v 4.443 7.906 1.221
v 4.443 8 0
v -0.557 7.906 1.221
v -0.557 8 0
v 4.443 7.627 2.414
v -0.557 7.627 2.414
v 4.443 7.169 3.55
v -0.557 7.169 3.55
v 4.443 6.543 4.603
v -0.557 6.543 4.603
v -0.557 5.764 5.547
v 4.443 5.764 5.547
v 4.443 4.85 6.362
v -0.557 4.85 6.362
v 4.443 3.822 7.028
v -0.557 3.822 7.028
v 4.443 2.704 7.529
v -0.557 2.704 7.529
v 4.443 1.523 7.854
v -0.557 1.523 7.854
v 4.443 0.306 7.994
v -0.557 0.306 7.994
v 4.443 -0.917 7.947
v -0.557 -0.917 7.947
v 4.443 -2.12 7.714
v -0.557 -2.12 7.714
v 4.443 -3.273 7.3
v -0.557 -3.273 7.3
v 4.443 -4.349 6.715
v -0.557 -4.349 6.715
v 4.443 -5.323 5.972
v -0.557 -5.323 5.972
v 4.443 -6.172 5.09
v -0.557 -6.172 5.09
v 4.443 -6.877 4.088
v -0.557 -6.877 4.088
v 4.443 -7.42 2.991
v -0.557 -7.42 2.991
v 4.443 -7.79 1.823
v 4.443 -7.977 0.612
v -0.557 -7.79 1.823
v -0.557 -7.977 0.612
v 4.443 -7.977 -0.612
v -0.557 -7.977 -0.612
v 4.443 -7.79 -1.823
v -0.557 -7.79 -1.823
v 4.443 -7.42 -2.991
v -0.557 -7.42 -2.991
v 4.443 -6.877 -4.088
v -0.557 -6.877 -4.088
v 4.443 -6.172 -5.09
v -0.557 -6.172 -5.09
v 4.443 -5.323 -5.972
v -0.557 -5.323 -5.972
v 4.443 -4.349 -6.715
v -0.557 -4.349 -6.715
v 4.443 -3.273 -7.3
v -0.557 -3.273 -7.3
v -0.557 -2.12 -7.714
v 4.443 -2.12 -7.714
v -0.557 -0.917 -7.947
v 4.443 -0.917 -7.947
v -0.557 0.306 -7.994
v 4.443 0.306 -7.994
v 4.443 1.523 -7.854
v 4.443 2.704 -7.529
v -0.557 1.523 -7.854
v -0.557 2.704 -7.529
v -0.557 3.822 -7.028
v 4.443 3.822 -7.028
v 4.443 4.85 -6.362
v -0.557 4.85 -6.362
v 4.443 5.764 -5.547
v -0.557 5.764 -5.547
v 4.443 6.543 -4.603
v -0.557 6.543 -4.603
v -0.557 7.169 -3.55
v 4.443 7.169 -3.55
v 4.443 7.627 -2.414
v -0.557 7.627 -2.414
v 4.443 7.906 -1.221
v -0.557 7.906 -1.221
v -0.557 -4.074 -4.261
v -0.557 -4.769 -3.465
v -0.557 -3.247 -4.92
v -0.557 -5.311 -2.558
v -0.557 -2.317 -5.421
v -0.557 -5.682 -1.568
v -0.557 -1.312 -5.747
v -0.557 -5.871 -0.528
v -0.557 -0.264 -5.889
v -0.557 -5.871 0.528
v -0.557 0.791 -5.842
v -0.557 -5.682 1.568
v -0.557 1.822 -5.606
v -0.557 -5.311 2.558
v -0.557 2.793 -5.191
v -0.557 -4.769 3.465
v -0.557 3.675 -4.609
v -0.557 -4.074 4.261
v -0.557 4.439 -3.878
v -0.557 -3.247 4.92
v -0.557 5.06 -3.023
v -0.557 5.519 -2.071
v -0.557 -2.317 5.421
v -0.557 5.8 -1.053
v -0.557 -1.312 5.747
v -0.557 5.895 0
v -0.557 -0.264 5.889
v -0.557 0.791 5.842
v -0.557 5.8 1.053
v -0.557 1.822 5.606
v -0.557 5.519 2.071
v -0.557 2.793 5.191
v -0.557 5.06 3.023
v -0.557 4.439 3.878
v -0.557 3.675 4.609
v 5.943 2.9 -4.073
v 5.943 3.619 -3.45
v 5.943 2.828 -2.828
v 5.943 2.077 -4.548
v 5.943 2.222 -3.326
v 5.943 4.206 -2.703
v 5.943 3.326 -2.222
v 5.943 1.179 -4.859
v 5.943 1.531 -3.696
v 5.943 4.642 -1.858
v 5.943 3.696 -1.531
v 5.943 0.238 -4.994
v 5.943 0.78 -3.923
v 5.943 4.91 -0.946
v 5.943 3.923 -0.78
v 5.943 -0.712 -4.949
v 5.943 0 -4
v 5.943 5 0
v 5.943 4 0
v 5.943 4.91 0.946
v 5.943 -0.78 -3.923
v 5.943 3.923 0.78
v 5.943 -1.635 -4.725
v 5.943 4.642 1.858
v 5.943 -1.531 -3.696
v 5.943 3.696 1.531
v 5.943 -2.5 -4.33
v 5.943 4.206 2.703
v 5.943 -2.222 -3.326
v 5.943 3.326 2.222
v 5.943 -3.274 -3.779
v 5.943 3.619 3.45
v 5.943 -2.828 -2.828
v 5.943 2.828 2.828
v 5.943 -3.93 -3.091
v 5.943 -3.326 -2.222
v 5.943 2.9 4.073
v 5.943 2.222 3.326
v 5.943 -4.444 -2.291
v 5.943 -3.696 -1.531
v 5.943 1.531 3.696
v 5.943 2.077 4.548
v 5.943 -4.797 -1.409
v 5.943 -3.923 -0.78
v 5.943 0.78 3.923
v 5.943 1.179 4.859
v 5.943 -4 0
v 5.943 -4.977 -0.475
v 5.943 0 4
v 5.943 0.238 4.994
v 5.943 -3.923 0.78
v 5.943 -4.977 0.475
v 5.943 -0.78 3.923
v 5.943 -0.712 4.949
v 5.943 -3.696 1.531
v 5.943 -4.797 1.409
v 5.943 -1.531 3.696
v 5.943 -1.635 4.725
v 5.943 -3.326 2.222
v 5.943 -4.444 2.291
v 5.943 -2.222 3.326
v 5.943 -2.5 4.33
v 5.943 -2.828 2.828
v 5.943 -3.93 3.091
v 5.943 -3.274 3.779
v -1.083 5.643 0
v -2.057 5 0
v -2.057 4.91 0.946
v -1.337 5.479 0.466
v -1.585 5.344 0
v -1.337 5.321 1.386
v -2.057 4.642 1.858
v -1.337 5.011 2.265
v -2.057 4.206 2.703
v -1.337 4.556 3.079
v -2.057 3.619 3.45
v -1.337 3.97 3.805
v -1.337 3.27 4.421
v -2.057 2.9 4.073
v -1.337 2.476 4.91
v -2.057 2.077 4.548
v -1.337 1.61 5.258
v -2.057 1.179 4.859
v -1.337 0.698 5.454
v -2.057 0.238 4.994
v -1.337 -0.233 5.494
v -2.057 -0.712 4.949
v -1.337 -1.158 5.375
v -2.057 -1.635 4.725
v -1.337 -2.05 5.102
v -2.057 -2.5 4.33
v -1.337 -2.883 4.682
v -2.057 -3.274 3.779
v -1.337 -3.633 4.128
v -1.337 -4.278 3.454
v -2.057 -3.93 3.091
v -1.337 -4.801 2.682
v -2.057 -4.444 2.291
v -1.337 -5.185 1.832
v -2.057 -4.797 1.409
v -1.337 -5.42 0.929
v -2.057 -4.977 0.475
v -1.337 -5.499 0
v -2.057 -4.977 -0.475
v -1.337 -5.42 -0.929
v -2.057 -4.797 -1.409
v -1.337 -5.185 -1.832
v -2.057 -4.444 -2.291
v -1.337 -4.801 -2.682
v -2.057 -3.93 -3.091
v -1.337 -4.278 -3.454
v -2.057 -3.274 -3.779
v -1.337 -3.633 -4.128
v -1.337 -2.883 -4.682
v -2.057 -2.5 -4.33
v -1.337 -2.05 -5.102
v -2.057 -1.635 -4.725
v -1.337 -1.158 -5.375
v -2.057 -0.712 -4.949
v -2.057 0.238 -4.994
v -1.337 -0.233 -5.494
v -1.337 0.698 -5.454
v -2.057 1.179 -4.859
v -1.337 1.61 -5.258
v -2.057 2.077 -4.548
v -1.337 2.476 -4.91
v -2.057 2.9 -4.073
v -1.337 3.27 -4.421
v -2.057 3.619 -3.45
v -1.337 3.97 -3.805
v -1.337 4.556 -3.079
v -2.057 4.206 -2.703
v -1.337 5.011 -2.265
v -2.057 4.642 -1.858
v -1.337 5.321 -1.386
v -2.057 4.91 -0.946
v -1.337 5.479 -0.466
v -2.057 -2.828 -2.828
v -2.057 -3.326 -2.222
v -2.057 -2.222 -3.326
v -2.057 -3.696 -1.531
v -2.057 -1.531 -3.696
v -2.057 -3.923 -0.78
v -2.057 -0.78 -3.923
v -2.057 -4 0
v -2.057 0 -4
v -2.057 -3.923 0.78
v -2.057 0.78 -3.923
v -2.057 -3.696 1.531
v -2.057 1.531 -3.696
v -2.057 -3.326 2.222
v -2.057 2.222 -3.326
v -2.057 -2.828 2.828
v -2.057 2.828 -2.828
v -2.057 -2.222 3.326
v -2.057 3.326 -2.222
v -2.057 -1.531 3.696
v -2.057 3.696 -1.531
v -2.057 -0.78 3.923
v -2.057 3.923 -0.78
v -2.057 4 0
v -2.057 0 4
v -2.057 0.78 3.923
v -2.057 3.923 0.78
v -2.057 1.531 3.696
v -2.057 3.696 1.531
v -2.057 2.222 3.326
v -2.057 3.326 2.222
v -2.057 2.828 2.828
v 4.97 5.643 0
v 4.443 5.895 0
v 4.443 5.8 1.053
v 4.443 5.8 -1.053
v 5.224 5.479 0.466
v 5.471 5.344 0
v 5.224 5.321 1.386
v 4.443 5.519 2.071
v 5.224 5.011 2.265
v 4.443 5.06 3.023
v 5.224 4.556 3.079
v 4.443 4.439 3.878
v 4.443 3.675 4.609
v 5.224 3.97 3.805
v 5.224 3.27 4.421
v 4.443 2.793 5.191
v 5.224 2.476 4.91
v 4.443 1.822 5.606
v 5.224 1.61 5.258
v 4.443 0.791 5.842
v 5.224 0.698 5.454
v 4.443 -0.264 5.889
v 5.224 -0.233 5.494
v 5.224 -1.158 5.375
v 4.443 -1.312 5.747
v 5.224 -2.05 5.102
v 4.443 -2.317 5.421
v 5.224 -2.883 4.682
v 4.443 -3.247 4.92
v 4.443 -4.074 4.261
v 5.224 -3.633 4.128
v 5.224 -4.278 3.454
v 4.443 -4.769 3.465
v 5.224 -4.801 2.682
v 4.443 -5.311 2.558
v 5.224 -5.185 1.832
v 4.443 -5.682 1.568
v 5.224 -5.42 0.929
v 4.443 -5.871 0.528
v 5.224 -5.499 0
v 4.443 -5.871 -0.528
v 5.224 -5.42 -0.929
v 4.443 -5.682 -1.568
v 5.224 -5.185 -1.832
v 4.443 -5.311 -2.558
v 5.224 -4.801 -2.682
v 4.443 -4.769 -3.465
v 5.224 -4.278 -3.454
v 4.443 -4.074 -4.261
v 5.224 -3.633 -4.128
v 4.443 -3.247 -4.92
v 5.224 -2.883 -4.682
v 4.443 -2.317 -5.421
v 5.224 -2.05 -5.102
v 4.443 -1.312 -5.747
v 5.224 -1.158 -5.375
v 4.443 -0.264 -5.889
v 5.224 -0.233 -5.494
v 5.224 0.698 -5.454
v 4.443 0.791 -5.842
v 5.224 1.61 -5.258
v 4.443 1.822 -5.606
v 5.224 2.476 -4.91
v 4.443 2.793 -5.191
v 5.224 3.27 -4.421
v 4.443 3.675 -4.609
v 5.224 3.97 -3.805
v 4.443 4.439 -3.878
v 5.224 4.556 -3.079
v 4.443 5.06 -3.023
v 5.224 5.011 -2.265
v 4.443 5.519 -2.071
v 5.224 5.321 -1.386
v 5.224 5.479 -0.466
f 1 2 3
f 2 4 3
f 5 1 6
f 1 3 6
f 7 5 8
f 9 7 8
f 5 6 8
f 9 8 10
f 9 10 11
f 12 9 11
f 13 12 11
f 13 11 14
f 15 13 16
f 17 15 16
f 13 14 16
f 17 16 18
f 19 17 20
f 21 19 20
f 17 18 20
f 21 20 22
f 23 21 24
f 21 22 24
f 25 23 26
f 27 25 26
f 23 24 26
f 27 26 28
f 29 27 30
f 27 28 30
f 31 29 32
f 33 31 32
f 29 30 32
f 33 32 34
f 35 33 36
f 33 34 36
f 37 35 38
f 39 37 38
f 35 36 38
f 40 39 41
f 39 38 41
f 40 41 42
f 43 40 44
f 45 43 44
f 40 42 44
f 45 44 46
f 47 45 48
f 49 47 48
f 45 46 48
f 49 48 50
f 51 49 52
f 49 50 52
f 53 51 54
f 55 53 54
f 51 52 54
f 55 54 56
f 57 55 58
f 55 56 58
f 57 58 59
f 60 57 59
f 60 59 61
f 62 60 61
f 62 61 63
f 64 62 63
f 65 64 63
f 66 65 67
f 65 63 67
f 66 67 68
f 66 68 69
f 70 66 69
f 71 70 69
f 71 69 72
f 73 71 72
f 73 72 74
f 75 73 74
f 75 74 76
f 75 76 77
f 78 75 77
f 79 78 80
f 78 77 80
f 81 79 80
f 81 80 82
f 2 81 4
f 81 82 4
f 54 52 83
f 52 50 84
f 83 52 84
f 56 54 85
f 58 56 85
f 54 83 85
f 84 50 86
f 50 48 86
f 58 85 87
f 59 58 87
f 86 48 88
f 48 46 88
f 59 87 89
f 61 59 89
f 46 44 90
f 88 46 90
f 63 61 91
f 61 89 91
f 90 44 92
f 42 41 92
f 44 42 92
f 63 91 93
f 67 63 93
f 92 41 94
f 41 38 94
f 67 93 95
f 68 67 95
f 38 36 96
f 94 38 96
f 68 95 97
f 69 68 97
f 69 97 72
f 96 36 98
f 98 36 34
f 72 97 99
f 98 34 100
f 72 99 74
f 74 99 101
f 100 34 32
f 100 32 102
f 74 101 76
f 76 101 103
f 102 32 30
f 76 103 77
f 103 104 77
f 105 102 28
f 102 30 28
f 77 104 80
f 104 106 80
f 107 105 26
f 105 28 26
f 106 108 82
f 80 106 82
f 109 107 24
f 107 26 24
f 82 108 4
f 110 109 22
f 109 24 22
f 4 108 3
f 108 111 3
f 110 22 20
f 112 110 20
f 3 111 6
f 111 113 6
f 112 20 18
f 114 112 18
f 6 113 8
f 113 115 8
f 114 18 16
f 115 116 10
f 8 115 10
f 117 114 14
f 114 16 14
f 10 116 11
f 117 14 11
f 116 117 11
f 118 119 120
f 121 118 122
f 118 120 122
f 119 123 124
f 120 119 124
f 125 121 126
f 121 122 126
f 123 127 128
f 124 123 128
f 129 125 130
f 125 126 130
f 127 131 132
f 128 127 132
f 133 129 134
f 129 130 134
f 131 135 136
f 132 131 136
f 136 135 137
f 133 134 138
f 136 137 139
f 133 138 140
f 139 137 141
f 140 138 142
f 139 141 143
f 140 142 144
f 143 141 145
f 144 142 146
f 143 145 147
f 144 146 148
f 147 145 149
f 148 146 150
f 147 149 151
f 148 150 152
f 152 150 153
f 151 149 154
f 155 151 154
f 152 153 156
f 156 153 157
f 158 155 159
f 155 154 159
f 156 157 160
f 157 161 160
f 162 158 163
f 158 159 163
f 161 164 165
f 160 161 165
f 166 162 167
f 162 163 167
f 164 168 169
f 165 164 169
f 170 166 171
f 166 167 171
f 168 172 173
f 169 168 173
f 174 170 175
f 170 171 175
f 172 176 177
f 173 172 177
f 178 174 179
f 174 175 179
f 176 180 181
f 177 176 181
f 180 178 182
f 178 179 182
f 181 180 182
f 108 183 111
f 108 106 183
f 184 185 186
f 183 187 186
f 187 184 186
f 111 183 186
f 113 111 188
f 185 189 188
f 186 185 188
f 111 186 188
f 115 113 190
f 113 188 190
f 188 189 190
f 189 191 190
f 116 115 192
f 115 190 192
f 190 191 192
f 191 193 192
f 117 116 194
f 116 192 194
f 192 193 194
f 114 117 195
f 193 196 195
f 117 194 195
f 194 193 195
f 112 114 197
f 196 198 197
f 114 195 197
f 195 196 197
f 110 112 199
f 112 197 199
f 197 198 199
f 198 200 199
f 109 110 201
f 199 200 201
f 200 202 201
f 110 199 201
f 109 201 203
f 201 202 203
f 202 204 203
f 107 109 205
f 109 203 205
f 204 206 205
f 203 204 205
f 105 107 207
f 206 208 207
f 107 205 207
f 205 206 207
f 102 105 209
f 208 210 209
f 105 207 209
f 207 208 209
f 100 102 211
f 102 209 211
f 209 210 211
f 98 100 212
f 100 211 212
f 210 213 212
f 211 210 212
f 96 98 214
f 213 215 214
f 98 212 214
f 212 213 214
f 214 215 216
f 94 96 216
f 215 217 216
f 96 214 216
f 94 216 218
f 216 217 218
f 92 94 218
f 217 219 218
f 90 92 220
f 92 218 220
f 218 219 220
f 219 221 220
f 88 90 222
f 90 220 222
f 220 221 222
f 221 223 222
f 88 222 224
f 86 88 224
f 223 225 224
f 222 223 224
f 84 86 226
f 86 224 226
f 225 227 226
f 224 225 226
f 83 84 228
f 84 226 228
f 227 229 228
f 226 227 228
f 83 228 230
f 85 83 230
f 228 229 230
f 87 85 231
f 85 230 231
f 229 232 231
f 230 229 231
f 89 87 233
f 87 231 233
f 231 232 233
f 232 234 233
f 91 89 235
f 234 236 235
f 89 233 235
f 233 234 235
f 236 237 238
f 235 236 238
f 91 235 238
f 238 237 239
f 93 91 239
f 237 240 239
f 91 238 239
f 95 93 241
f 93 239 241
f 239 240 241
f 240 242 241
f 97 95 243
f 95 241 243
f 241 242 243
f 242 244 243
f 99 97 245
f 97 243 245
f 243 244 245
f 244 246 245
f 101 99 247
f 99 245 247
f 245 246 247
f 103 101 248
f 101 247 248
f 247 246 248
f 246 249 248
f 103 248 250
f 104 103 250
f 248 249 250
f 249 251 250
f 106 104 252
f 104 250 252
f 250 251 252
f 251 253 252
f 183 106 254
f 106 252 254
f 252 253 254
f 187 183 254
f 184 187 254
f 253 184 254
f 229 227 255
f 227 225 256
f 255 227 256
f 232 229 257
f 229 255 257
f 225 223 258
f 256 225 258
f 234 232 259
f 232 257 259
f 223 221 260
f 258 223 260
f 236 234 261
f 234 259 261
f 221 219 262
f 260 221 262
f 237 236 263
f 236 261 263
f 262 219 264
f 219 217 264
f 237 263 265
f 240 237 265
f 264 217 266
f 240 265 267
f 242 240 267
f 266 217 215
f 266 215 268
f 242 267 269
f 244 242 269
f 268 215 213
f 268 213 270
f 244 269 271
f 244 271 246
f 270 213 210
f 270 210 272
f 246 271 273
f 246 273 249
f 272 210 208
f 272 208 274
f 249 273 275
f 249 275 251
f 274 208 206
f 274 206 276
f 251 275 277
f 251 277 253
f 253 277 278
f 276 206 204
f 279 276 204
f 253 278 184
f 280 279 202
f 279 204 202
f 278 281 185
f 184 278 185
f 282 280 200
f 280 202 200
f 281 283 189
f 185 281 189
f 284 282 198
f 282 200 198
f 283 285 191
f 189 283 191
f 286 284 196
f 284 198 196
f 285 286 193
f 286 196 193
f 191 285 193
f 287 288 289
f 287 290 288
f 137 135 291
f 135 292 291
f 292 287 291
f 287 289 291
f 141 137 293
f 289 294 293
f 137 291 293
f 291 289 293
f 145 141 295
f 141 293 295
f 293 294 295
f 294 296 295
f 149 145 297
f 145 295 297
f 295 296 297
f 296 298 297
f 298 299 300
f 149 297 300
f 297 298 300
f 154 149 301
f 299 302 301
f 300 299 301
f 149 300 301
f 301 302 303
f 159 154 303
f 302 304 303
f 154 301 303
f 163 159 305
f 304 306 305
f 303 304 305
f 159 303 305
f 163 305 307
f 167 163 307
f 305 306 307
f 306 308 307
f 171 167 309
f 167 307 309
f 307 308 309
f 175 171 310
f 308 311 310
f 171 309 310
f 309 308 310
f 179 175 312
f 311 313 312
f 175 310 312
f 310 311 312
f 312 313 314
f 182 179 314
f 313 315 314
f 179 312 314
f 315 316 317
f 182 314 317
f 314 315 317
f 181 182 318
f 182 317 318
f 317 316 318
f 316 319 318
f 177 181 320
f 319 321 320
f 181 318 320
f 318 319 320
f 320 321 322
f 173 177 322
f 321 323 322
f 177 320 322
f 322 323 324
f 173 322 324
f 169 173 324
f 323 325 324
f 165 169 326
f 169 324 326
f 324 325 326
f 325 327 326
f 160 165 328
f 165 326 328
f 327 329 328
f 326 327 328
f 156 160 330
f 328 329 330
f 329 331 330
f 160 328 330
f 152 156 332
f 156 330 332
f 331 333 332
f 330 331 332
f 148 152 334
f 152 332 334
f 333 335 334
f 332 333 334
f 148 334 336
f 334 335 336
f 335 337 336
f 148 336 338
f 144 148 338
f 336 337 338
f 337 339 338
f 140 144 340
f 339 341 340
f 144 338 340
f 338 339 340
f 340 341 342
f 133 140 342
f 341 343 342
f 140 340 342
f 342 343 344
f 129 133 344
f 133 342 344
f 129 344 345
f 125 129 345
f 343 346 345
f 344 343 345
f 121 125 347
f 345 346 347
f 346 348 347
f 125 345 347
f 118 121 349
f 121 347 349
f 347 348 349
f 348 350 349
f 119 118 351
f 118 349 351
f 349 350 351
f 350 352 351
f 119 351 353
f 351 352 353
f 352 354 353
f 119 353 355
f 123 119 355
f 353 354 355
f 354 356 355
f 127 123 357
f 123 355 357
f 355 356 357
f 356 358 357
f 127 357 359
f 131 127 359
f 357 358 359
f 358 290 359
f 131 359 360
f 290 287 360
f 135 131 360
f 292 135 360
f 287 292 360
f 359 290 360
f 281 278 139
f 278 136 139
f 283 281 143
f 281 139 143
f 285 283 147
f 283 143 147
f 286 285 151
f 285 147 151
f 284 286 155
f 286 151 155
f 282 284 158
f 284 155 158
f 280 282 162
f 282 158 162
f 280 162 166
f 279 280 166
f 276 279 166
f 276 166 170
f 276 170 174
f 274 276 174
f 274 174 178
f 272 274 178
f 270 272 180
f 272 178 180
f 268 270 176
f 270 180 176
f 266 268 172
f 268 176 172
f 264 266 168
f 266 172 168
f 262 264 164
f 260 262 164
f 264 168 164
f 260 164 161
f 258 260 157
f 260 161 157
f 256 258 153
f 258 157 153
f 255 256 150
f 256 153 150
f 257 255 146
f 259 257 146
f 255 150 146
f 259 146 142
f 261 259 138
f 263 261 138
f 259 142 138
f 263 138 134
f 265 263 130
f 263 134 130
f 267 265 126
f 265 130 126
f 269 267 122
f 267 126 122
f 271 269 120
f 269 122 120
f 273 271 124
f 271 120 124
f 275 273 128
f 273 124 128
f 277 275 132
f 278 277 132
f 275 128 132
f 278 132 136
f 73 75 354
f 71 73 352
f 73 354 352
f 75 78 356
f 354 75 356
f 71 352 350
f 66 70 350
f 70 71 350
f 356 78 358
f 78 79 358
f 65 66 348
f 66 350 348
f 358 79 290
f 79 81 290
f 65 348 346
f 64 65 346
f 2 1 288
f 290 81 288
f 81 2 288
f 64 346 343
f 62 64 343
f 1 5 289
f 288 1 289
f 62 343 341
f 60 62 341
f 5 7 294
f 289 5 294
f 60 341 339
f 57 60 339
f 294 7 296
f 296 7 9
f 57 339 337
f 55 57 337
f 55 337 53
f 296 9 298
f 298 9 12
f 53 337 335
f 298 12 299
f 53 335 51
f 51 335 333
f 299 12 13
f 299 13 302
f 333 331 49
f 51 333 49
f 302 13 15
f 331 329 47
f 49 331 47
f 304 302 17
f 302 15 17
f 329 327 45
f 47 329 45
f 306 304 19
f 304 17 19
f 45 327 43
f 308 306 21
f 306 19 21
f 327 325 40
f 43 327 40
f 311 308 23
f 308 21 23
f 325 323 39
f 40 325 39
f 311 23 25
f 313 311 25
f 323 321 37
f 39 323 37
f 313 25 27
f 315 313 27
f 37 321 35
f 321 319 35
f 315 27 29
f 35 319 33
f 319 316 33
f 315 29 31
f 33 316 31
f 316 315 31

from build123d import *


with BuildPart() as part:
    # 草图1 → 旋转1 (revolve)
    with BuildSketch(Plane.XY):
        with BuildLine():
            Line((4.4431655, 5.894913061), (4.4431655, 8))
            Line((4.4431655, 8), (-0.5568345, 8))
            Line((-0.5568345, 8), (-0.5568345, 5.894913061))
            ThreePointArc((-0.5568345, 5.894913061), (-1.337492566, 5.498843756), (-2.0568345, 5))
            Line((-2.0568345, 5), (-2.0568345, 4))
            Line((-2.0568345, 4), (5.9431655, 4))
            Line((5.9431655, 4), (5.9431655, 5))
            ThreePointArc((5.9431655, 5), (5.223823567, 5.498843756), (4.4431655, 5.894913061))
        make_face()
    revolve(axis=Axis((0, 0, 0), (1, 0, 0)))


solid = part.part
